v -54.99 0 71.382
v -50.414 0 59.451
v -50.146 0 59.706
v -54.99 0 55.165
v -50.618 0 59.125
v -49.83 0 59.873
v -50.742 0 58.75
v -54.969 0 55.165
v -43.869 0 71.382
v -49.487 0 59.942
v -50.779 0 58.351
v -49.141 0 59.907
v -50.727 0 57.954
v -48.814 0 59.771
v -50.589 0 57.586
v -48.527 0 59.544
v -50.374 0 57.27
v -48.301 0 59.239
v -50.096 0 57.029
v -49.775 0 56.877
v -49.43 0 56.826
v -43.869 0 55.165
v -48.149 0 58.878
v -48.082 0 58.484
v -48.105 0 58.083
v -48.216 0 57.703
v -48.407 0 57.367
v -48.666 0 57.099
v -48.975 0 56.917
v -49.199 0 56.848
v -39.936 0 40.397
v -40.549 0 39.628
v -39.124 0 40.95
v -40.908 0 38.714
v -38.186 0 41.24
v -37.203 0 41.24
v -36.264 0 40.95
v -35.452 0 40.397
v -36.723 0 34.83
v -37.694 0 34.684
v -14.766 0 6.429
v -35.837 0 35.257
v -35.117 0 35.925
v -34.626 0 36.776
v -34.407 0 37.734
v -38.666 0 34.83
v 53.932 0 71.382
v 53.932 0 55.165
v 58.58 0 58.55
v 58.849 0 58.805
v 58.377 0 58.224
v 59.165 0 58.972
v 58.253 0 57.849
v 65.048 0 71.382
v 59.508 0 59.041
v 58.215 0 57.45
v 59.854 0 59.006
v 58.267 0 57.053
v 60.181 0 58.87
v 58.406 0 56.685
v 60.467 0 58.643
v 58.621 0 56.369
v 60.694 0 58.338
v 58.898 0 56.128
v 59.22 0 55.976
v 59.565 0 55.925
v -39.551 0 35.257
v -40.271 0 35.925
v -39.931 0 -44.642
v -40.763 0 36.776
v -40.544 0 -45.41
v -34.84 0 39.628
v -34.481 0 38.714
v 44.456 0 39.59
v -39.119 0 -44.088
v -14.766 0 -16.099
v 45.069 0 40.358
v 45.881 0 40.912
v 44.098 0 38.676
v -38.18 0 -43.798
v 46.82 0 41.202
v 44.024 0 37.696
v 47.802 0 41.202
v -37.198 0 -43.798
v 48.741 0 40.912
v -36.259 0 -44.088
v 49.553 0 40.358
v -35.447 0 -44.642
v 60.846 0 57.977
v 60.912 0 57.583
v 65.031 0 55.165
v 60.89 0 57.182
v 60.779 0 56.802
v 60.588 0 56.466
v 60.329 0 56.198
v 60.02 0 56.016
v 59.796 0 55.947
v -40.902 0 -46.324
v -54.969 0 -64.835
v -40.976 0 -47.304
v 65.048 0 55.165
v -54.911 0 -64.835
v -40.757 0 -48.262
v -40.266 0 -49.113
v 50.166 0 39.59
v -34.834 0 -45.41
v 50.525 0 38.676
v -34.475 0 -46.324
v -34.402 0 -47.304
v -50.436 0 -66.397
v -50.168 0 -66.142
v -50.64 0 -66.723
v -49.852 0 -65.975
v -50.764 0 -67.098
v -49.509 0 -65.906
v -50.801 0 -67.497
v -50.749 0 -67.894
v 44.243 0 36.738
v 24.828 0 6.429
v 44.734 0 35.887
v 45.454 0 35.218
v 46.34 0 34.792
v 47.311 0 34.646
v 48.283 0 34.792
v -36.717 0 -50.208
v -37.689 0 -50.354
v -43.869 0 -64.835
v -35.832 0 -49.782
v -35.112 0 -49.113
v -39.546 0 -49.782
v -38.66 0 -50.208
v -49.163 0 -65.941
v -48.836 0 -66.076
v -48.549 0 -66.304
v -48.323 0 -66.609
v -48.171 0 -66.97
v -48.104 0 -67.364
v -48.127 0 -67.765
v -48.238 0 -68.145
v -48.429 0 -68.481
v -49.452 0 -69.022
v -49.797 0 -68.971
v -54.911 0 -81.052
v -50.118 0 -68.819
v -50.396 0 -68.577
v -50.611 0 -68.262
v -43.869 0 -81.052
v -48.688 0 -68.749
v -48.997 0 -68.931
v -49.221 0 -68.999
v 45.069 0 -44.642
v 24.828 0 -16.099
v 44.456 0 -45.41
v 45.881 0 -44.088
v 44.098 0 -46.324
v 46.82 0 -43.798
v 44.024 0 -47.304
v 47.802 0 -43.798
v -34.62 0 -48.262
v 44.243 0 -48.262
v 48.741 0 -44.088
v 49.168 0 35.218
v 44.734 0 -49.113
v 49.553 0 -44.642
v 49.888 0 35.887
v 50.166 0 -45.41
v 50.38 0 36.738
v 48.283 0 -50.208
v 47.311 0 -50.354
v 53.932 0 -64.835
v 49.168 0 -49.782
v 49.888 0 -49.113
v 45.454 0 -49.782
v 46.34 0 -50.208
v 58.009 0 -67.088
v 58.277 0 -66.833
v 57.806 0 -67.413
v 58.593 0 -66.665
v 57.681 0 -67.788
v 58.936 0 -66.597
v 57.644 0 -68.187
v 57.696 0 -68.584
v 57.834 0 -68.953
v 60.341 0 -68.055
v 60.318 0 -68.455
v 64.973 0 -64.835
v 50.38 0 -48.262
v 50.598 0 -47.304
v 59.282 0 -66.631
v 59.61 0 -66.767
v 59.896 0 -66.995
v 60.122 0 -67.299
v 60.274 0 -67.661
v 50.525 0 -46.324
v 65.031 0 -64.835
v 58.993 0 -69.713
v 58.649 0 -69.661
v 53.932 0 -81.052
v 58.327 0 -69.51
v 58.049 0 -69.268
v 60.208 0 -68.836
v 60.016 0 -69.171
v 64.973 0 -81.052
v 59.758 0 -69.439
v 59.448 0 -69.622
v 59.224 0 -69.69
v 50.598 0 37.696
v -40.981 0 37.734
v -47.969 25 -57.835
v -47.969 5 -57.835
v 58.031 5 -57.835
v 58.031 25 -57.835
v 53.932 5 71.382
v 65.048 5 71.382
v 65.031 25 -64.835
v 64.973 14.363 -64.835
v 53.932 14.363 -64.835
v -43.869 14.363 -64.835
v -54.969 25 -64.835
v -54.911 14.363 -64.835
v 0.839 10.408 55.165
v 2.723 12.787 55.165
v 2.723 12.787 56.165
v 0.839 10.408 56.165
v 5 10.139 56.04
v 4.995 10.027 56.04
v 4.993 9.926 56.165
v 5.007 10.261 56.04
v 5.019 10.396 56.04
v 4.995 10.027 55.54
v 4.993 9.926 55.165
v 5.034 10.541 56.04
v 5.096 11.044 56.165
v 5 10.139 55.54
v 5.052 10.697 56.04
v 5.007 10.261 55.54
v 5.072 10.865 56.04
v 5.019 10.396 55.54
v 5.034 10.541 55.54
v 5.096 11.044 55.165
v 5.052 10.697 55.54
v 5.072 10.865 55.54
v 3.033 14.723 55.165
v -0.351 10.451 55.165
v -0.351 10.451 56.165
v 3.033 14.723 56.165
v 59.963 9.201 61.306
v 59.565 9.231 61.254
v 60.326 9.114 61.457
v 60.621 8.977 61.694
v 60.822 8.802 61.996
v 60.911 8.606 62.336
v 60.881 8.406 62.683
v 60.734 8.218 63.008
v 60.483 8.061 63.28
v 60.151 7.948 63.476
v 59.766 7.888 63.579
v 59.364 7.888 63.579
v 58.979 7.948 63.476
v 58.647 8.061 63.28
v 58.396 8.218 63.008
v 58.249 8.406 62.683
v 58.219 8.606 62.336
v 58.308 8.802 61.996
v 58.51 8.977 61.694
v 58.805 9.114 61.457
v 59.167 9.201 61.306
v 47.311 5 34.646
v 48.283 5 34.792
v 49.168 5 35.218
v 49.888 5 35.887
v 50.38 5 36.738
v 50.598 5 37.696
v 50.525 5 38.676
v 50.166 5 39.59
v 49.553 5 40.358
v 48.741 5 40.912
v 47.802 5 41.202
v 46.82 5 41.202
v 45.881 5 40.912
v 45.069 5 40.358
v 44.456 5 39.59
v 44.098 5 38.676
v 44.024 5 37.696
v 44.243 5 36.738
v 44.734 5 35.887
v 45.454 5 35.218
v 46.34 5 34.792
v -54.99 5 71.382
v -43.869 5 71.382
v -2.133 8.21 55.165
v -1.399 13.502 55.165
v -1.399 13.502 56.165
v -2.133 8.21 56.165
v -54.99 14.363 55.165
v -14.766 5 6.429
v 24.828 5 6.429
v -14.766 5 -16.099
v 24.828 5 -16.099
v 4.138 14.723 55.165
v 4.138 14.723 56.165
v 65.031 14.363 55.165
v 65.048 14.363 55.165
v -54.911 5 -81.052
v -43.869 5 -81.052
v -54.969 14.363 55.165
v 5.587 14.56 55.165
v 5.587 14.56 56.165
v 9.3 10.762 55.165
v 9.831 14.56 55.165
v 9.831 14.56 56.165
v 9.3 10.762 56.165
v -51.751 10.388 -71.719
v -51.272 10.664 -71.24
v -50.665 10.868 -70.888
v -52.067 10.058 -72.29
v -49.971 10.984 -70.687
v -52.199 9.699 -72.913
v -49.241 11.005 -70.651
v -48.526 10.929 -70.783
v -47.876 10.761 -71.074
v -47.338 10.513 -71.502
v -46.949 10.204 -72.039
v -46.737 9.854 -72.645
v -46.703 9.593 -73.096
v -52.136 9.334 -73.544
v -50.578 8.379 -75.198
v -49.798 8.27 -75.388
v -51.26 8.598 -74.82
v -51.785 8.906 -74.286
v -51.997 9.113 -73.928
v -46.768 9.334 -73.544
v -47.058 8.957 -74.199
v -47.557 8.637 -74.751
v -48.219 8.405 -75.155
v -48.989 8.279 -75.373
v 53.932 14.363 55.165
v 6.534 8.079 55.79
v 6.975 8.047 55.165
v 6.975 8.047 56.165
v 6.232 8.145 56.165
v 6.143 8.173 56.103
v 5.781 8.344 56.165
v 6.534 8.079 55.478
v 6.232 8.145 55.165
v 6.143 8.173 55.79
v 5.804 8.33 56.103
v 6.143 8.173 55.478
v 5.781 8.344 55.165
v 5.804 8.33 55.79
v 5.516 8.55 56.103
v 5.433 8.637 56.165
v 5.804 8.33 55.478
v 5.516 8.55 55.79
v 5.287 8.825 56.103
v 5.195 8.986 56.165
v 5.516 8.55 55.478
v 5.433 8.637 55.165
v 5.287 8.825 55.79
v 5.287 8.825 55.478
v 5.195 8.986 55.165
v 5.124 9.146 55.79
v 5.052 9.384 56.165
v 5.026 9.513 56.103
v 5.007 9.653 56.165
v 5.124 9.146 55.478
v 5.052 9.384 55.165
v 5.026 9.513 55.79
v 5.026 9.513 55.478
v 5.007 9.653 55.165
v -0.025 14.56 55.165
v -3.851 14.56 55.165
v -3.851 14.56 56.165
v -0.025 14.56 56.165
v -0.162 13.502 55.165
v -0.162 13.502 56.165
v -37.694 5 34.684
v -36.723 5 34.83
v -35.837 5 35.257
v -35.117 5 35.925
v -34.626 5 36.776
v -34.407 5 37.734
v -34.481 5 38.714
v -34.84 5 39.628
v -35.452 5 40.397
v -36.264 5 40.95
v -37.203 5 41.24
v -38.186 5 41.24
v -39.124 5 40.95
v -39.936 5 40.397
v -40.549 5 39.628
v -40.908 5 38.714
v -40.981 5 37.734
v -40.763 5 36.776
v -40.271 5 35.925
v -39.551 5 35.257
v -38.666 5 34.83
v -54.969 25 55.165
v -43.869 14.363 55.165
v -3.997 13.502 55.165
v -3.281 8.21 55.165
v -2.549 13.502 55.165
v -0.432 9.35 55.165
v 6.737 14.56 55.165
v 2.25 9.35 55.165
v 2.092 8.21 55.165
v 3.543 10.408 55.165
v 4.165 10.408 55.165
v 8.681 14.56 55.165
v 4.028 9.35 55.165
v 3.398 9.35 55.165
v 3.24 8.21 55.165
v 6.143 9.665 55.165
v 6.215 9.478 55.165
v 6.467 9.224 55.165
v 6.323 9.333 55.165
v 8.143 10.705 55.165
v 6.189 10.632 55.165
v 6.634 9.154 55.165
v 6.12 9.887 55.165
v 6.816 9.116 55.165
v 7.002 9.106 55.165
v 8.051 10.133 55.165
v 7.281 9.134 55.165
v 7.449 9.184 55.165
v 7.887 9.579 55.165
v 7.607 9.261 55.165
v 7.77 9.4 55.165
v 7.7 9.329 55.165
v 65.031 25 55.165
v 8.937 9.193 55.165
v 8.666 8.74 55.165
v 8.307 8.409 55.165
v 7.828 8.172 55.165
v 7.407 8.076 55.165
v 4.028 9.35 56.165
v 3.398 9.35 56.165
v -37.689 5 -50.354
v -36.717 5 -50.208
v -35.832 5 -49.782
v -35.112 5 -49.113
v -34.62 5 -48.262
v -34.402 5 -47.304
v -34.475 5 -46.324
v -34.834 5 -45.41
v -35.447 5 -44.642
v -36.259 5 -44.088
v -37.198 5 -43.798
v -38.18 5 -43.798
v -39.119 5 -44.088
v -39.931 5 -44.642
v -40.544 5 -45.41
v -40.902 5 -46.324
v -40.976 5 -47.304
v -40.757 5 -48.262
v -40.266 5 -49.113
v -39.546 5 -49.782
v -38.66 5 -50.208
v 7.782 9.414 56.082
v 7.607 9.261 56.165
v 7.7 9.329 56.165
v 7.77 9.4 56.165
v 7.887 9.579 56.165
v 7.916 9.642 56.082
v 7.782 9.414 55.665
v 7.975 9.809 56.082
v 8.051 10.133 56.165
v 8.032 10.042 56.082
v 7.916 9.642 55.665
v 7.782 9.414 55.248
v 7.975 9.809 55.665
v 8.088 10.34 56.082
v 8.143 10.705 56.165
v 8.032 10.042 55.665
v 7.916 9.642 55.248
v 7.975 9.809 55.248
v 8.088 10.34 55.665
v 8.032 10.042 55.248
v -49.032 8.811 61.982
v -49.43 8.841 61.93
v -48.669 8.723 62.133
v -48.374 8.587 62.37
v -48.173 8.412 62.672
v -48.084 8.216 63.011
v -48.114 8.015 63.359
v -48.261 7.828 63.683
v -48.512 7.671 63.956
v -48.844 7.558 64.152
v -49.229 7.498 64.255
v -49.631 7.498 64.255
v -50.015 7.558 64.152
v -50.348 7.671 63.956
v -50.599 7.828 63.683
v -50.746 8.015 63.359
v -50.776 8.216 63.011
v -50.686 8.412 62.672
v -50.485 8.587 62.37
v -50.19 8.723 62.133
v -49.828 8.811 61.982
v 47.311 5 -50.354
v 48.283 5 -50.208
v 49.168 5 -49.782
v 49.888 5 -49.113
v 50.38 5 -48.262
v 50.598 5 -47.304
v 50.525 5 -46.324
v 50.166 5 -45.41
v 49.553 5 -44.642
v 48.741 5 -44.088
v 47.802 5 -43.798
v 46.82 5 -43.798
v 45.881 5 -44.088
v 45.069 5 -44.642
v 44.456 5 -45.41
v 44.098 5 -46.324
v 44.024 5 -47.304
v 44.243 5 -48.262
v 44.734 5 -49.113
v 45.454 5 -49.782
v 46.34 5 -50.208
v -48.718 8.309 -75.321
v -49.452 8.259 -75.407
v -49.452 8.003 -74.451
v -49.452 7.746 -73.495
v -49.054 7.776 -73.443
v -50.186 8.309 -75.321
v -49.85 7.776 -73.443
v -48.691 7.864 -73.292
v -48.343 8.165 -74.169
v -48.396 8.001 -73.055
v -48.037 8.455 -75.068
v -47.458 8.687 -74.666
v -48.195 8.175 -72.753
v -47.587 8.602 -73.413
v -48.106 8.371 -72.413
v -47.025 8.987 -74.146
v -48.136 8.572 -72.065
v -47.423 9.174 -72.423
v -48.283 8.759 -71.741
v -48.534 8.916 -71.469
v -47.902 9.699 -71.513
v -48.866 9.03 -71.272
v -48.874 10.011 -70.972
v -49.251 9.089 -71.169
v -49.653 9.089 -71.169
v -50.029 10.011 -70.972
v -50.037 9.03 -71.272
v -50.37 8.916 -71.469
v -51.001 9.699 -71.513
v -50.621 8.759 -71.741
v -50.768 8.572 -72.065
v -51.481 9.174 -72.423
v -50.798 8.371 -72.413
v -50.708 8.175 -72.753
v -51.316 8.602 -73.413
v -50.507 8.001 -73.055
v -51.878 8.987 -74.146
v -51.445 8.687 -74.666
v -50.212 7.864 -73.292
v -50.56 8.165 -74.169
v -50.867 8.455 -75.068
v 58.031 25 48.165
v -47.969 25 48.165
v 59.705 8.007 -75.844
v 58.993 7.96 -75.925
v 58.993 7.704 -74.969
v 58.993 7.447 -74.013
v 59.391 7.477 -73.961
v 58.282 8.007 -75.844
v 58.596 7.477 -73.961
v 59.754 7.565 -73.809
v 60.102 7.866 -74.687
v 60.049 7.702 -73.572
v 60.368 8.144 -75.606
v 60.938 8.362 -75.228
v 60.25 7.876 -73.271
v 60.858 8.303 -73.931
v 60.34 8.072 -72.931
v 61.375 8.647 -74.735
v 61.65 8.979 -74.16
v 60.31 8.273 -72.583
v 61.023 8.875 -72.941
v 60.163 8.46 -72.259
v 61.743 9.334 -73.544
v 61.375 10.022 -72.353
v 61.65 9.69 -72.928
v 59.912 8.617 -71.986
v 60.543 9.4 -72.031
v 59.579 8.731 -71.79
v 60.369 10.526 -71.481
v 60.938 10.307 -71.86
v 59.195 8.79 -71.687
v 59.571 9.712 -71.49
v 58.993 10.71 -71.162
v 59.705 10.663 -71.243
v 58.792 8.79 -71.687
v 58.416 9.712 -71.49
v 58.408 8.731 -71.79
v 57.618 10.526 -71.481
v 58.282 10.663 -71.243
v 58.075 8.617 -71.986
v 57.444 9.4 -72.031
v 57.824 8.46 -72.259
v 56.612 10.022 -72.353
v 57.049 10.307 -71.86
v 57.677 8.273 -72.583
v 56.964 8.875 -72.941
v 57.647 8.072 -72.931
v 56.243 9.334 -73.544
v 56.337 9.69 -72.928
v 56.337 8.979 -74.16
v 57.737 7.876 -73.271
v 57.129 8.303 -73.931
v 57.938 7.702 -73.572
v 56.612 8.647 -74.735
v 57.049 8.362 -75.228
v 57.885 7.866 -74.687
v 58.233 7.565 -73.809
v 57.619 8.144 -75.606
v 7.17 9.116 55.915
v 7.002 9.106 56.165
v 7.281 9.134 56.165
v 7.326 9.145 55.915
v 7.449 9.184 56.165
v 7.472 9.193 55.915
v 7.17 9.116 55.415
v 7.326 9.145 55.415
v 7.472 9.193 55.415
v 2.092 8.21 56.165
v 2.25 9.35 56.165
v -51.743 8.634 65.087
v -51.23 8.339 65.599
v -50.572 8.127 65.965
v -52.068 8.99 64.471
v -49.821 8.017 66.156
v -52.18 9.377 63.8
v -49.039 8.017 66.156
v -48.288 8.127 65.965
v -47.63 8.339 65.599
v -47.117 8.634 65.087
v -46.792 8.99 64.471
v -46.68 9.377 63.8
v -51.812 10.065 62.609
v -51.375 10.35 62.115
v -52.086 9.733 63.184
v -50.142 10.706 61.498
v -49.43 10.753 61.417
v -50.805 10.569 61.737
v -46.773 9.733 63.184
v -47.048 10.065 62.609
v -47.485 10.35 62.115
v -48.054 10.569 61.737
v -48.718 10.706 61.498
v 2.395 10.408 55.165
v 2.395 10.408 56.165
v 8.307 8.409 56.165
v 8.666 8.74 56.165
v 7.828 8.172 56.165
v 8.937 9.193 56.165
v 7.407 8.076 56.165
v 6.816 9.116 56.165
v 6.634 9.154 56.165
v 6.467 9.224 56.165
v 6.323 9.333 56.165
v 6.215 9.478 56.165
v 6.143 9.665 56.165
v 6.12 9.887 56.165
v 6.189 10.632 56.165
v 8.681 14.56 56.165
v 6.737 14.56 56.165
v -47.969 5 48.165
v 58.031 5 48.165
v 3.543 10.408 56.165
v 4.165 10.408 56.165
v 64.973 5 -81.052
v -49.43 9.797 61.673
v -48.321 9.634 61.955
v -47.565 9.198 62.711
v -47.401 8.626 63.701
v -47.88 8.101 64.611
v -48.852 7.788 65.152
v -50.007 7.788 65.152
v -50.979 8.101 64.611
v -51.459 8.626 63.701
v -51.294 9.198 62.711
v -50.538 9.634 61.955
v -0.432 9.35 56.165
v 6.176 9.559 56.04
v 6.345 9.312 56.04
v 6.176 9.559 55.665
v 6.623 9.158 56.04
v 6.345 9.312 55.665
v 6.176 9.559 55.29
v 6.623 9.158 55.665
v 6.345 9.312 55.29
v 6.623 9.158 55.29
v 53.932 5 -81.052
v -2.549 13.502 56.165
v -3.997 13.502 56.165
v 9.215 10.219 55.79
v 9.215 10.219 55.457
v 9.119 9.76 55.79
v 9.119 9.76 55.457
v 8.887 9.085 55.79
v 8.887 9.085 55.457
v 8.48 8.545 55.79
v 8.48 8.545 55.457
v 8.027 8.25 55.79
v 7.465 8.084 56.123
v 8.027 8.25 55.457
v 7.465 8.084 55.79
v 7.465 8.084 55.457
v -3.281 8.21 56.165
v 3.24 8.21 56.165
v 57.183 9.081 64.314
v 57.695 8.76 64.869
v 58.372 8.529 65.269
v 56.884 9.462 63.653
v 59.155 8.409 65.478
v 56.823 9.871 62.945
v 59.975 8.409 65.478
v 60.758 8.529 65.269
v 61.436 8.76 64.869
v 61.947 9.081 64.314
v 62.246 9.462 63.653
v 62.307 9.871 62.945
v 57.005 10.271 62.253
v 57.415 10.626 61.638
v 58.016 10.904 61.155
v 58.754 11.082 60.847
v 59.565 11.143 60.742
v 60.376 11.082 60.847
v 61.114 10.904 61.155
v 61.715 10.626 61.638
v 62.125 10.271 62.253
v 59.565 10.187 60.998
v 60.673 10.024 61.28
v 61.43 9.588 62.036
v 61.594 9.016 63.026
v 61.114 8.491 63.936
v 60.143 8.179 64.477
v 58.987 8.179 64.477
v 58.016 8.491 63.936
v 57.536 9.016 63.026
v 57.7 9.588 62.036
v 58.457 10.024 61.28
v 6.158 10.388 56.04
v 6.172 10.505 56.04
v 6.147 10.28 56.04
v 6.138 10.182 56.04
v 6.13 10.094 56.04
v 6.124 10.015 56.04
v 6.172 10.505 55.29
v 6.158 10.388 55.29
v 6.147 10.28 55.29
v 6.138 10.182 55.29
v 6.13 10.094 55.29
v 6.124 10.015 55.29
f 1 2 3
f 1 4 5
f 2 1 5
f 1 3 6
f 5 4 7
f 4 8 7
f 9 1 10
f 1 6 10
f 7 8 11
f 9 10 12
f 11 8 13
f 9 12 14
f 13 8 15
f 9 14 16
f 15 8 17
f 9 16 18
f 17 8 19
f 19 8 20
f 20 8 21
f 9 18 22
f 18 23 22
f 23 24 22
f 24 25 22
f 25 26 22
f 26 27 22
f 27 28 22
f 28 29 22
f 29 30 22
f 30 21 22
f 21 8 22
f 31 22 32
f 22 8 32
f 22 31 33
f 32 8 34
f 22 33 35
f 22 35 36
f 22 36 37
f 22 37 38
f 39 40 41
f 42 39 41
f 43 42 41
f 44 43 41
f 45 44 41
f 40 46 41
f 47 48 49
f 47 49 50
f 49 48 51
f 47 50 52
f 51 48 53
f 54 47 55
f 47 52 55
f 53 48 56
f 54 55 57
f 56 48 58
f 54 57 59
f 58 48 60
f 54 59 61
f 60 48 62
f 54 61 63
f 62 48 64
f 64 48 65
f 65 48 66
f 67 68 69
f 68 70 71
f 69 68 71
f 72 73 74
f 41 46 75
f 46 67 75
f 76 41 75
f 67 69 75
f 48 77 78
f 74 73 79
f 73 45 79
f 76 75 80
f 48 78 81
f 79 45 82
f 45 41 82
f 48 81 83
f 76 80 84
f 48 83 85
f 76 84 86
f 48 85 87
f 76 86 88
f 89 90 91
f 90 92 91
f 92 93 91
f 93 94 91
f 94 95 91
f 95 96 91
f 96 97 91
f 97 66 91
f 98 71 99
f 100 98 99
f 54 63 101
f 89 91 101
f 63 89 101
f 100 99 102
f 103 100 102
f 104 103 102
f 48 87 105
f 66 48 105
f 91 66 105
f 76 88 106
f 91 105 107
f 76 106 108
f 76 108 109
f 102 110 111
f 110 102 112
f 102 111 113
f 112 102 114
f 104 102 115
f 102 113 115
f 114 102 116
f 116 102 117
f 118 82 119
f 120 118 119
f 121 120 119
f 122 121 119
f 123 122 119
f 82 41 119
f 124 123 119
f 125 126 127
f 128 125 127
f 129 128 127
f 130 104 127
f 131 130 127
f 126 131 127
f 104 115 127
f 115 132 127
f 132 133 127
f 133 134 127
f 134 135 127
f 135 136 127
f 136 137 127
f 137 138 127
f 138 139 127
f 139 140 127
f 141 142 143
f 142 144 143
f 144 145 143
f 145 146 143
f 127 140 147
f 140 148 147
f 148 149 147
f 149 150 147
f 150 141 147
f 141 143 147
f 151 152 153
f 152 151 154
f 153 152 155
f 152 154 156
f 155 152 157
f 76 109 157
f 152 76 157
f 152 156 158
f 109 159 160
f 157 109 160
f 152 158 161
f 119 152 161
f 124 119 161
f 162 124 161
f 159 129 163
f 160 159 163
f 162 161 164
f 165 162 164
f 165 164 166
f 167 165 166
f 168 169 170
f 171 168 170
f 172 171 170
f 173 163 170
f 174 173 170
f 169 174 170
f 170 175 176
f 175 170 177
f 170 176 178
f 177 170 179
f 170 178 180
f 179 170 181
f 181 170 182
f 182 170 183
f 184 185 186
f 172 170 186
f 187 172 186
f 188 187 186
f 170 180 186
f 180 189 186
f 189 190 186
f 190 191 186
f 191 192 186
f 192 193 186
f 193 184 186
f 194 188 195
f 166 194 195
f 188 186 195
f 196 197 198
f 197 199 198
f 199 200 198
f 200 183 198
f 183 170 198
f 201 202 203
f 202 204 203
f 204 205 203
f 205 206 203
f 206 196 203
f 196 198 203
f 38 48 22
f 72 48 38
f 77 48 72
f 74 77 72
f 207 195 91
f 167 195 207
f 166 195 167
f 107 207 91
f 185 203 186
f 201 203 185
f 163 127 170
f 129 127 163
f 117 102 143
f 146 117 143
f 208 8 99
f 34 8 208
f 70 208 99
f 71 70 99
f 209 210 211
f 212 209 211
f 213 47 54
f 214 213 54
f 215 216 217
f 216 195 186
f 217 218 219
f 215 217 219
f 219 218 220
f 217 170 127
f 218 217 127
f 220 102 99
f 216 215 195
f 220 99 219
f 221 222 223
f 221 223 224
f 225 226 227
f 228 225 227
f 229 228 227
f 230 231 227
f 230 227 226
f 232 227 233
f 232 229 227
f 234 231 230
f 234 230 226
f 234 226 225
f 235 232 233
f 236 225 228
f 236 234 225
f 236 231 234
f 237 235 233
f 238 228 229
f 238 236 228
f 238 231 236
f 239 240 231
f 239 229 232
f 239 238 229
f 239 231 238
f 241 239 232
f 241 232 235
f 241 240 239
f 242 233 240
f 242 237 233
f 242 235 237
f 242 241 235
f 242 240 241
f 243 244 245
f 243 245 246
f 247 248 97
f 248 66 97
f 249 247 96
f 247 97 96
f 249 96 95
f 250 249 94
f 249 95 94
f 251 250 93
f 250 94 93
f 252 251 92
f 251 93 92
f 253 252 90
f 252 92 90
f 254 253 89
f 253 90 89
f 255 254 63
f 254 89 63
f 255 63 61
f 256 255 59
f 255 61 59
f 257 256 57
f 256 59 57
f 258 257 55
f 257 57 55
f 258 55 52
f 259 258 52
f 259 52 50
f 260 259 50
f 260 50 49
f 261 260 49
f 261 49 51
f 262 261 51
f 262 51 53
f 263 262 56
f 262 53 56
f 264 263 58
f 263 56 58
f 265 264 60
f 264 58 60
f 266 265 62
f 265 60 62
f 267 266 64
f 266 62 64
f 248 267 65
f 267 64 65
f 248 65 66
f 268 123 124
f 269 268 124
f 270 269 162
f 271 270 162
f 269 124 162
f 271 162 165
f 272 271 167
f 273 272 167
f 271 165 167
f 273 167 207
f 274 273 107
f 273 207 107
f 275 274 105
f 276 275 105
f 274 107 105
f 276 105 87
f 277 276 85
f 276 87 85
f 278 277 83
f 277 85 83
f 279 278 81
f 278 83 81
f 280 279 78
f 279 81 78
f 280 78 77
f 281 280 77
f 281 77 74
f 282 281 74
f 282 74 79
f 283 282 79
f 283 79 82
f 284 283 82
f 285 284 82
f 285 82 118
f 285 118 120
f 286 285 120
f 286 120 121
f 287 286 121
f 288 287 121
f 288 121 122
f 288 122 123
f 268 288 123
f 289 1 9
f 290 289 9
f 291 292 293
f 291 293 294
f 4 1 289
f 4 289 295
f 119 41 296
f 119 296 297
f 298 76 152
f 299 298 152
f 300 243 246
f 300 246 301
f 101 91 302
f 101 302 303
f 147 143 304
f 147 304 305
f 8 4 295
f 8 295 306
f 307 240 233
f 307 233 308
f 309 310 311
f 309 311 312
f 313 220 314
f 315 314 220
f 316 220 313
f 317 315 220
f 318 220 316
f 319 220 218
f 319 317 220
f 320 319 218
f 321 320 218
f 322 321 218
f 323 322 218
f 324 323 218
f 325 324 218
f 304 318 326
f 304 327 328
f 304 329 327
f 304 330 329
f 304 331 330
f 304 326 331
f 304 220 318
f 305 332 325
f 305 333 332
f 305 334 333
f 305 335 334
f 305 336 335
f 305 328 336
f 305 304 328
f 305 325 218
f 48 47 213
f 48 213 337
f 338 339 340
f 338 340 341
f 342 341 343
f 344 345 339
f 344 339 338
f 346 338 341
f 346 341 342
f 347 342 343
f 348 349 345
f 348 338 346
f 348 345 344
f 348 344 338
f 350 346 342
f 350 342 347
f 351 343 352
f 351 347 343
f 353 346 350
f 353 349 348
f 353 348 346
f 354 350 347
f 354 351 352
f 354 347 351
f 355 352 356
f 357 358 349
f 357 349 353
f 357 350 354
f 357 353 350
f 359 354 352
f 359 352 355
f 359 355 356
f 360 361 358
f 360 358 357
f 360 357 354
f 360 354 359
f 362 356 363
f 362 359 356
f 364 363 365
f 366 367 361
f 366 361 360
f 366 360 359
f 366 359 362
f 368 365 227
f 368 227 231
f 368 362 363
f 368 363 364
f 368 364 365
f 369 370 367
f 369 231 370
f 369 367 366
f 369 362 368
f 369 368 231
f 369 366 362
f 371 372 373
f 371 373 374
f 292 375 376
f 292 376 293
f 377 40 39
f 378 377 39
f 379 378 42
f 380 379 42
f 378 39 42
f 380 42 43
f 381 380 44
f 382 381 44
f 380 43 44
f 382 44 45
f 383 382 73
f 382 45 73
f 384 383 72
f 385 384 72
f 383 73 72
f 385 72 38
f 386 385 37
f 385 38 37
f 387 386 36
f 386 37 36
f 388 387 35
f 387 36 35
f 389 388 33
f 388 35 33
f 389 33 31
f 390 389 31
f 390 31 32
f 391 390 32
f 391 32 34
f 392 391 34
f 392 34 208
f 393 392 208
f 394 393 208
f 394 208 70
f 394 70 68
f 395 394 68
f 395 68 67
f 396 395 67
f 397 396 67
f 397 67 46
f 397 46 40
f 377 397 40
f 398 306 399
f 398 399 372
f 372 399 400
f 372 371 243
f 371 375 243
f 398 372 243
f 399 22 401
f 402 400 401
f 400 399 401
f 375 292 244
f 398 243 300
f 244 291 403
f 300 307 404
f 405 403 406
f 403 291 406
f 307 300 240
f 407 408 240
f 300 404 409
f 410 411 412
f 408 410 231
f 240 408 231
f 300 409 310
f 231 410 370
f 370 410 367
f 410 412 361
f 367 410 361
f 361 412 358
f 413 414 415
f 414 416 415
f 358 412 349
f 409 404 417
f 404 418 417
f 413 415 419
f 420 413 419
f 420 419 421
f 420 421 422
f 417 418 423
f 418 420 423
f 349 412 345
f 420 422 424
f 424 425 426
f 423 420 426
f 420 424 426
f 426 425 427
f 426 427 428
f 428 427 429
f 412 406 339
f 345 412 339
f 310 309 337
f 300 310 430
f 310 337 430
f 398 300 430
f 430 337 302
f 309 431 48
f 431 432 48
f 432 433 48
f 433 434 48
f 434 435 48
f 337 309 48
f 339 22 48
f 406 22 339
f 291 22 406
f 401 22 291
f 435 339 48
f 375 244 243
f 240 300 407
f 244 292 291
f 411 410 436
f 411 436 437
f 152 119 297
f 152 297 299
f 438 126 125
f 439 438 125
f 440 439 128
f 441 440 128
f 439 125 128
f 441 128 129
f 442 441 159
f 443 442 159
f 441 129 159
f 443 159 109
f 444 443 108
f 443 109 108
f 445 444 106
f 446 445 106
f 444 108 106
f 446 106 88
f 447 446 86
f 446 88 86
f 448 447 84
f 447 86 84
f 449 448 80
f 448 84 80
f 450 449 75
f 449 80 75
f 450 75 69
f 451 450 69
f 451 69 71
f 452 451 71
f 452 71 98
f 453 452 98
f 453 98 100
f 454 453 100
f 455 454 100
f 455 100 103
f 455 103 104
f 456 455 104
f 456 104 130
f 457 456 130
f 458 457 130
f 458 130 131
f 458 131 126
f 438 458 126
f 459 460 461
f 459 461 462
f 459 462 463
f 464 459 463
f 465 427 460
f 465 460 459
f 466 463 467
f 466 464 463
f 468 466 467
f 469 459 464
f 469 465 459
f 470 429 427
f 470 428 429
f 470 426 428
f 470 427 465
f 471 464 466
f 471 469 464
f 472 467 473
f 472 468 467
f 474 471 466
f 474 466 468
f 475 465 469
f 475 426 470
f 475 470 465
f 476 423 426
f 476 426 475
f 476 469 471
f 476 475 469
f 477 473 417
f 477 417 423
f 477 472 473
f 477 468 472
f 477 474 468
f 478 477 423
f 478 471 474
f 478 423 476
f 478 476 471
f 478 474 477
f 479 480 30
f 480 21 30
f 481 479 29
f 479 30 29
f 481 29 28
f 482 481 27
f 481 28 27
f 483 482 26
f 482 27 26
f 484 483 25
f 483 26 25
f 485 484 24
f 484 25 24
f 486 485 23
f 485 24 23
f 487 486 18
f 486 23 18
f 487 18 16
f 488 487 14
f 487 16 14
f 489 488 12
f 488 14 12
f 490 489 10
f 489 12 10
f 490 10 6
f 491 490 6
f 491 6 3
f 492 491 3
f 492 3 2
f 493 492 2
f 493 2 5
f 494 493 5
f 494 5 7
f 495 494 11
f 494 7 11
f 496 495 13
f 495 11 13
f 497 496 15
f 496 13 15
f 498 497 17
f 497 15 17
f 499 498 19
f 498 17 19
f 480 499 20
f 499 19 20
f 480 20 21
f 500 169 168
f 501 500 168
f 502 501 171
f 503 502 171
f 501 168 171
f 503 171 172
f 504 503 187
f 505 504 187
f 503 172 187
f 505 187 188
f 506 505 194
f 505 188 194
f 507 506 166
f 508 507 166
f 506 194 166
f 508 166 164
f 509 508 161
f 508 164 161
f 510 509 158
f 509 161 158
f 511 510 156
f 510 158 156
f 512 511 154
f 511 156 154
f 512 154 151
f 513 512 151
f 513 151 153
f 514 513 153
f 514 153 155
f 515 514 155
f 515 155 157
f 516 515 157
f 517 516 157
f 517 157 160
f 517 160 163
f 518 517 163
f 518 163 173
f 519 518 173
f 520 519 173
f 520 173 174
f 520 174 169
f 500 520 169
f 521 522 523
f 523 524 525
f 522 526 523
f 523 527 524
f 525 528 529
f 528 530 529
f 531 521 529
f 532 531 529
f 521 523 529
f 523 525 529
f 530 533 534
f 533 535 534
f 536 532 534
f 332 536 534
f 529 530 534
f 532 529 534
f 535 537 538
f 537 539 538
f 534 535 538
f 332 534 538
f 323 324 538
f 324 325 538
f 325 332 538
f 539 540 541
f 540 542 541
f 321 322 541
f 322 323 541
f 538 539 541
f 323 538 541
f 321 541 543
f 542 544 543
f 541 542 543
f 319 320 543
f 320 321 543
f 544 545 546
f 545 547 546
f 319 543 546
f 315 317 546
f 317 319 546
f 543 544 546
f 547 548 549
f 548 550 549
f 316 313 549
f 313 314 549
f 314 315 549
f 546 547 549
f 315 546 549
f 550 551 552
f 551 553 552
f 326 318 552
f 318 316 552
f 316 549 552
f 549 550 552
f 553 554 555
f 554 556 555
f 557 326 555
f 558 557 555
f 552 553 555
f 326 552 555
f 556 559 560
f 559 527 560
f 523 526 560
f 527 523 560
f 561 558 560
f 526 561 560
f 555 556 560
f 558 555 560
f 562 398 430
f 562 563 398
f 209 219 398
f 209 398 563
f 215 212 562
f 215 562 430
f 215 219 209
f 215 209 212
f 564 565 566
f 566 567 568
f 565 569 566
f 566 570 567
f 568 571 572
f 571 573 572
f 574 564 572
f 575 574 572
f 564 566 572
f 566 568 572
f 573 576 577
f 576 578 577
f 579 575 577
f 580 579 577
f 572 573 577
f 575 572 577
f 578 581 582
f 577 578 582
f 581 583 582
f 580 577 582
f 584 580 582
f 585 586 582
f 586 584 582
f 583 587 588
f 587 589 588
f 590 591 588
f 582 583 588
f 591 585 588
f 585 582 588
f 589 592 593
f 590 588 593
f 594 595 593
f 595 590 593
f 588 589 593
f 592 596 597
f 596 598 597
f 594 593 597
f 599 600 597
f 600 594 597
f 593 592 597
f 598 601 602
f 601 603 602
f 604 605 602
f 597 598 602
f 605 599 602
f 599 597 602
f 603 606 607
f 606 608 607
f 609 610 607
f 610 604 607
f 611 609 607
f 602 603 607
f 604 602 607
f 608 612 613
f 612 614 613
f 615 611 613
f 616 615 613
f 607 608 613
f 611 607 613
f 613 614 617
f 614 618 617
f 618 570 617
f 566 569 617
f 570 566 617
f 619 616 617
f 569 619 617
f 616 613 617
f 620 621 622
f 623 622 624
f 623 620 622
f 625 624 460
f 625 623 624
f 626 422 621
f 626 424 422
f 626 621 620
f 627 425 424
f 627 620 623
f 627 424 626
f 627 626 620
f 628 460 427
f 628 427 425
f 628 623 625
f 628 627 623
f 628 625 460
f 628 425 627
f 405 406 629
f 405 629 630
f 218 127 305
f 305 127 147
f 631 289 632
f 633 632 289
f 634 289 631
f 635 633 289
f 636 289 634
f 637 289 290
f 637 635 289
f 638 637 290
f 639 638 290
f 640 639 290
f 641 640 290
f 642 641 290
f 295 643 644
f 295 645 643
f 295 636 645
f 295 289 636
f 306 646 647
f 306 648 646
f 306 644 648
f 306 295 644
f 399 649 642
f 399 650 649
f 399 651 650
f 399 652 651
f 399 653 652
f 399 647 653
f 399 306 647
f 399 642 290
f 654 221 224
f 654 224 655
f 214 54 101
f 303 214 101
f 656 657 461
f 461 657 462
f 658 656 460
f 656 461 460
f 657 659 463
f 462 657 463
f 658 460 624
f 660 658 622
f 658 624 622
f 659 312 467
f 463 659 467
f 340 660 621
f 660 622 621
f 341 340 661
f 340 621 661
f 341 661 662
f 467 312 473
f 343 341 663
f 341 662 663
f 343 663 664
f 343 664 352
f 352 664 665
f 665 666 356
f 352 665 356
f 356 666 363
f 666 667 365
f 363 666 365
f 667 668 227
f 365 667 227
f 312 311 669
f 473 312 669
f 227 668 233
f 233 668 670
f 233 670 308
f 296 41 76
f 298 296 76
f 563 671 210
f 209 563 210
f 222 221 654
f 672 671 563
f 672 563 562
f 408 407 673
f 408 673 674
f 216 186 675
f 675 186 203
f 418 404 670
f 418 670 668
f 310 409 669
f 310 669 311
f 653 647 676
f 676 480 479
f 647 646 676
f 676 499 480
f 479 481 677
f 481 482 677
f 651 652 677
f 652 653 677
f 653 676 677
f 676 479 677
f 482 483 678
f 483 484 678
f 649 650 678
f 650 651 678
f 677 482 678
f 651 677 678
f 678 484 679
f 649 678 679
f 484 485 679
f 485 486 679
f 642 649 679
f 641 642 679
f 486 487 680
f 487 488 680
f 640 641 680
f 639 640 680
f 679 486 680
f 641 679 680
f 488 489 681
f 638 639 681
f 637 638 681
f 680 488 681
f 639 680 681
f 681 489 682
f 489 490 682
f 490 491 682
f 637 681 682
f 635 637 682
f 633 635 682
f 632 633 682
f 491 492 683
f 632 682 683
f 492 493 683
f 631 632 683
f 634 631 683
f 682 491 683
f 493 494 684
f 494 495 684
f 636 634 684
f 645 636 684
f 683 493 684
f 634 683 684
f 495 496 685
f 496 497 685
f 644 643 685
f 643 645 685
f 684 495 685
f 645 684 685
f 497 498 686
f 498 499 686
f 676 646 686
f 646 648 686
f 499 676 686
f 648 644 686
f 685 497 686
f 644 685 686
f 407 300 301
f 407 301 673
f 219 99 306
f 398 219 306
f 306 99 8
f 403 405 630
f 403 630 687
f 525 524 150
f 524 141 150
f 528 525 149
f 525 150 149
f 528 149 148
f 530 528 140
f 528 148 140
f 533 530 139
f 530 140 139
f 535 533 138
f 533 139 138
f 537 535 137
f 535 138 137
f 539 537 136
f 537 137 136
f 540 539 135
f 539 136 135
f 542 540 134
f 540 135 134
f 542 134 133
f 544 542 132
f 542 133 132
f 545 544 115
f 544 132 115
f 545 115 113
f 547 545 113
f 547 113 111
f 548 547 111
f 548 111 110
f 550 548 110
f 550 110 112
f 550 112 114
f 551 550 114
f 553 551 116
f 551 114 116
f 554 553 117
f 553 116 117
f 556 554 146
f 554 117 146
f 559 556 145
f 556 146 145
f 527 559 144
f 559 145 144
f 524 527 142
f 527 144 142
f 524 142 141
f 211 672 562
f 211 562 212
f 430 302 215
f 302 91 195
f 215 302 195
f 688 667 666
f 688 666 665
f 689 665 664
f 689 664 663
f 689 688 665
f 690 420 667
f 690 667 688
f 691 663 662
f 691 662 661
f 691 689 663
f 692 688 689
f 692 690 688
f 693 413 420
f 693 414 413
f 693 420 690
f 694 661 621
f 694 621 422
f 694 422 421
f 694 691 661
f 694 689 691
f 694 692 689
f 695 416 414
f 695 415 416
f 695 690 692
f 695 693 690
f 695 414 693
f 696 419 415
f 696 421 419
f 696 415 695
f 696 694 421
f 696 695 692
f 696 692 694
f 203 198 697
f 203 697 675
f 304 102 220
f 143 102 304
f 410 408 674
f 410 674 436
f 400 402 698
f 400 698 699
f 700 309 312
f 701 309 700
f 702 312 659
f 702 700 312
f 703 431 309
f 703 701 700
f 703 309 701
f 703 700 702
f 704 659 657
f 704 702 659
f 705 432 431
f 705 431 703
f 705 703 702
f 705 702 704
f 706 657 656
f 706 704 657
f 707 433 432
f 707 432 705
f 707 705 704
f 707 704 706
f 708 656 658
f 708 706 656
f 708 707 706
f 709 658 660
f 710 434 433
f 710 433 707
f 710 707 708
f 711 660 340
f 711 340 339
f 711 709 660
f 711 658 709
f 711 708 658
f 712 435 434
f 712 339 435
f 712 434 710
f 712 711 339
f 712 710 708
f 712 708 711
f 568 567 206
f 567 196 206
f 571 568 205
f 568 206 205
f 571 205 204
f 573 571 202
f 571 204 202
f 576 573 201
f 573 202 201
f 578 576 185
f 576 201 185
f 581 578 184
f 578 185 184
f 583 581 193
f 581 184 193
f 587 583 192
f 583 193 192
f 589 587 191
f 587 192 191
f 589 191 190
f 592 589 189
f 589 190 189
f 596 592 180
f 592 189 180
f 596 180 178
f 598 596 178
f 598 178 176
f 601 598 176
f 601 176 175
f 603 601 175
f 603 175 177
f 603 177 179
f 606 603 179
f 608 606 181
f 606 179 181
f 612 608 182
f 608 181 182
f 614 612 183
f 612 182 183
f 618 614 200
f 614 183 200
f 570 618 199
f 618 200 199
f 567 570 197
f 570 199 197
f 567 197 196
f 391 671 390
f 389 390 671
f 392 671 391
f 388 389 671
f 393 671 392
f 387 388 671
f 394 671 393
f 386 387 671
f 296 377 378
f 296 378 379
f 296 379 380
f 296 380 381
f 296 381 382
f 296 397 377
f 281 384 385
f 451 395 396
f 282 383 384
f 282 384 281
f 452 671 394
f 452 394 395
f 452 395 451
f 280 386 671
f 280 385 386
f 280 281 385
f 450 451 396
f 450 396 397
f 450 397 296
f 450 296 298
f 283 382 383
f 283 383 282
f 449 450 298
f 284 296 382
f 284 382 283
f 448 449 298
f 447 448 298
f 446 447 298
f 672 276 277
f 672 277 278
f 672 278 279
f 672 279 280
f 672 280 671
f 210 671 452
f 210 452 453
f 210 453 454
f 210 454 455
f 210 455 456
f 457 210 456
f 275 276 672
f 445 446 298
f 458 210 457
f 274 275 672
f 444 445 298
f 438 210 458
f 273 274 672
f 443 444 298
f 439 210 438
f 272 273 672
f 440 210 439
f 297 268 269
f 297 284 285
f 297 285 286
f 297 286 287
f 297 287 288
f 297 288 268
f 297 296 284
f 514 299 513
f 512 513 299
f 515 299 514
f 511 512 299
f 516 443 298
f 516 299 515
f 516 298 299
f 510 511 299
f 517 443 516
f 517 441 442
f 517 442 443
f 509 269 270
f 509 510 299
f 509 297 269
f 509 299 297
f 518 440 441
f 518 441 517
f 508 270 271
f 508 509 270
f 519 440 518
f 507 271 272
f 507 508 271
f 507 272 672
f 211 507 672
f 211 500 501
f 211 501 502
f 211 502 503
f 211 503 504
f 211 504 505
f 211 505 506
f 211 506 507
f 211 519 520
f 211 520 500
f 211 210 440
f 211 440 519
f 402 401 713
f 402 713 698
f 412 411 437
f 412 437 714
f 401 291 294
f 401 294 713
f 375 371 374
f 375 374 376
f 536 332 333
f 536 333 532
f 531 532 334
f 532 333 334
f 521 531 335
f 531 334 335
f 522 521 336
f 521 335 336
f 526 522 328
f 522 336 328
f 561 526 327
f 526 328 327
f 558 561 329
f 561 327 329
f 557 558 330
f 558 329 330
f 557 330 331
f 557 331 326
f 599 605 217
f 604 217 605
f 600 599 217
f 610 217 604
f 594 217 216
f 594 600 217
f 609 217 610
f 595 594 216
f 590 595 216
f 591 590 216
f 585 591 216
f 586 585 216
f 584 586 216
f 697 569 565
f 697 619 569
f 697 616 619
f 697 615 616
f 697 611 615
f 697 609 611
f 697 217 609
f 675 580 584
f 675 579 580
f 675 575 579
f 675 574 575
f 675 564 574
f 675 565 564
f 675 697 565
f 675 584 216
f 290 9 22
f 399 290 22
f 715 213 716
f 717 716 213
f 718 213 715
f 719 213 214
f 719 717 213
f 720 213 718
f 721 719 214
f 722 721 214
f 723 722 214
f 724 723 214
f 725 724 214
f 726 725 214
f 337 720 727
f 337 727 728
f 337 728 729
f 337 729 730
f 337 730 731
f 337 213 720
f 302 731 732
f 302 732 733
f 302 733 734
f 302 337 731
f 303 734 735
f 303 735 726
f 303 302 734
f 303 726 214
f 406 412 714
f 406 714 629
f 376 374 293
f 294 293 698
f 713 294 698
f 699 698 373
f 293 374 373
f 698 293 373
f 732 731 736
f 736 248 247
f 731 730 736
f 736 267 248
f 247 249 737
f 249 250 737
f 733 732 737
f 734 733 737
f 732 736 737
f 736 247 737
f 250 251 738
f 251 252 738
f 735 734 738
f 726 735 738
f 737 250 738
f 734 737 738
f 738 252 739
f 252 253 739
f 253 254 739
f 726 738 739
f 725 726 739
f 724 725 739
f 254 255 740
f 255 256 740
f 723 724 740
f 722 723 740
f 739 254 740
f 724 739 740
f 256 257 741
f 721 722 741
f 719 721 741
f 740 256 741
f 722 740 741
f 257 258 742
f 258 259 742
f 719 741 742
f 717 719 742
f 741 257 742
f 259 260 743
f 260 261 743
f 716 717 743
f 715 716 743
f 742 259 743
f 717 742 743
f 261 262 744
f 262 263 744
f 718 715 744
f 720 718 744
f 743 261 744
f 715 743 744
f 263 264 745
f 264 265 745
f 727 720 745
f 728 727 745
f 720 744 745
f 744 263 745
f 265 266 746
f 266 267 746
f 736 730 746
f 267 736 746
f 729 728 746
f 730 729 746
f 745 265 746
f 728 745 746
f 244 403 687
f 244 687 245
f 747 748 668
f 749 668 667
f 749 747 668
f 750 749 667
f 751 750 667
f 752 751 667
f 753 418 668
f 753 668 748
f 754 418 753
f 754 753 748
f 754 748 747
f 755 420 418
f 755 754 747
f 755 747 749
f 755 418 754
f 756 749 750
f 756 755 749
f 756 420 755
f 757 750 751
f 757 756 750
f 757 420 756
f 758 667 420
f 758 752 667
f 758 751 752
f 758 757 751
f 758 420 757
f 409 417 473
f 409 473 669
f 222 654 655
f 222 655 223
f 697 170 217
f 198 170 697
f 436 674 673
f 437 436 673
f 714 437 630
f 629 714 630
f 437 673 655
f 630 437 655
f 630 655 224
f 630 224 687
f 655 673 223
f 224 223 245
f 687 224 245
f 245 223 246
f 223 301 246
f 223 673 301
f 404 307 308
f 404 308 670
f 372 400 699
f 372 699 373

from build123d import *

# Parameters (mm, degrees)
SKETCH1_W                                            = 106
SKETCH1_H                                            = 106
SKETCH1_W_2                                          = 39.59401571
SKETCH1_H_2                                          = 22.527629628
BOSS_EXTRUDE1_DEPTH                                  = 5
SKETCH1_4_W                                          = 106
SKETCH1_4_H                                          = 106
BOSS_EXTRUDE2_DEPTH                                  = 25
SKETCH1_6_W                                          = 11.041643383
SKETCH1_6_H                                          = 16.216795515
BOSS_EXTRUDE4_DEPTH                                  = 5
SKETCH1_8_W                                          = 11.041643383
SKETCH1_8_H                                          = 16.216795515
BOSS_EXTRUDE5_DEPTH                                  = 5
SKETCH1_10_W                                         = 11.121003358
SKETCH1_10_H                                         = 16.216795515
SKETCH1_10_W_2                                       = 11.11598595
BOSS_EXTRUDE7_DEPTH                                  = 5
DRAFT1_ANGLE                                         = 1
DRAFT2_ANGLE                                         = 45
DRAFT3_ANGLE                                         = 30
DRAFT4_ANGLE                                         = 30
DRAFT6_ANGLE                                         = 30
DRAFT7_ANGLE                                         = 30
CSK_FOR_M2_5_OVAL_HEAD_MACHINE_SCREW1_D              = 2.7
CSK_FOR_M2_5_OVAL_HEAD_MACHINE_SCREW1_CSINK_D        = 5.5
CSK_FOR_M2_5_OVAL_HEAD_MACHINE_SCREW1_CSINK_ANGLE    = 90
CSK_FOR_M2_5_OVAL_HEAD_MACHINE_SCREW1_ON_D           = 2.7
CSK_FOR_M2_5_OVAL_HEAD_MACHINE_SCREW1_ON_CSINK_D     = 5.5
CSK_FOR_M2_5_OVAL_HEAD_MACHINE_SCREW1_ON_CSINK_ANGLE = 90
CSK_FOR_M2_5_OVAL_HEAD_MACHINE_SCREW_2_D             = 2.7
CSK_FOR_M2_5_OVAL_HEAD_MACHINE_SCREW_2_CSINK_D       = 5.5
CSK_FOR_M2_5_OVAL_HEAD_MACHINE_SCREW_2_CSINK_ANGLE   = 90
BOSS_EXTRUDE9_DEPTH                                  = 1
SKETCH14_R                                           = 3.296320564
CUT_EXTRUDE1_DEPTH                                   = 10


with BuildPart() as part:
    # Sketch1 → Boss-Extrude1 (new body)
    with BuildSketch(Plane(origin=(0, 0, 0), x_dir=(1, 0, 0), z_dir=(0, 1, 0))):
        with Locations((5.031290625, 4.83488638)):
            Rectangle(SKETCH1_W, SKETCH1_H)
        with Locations((5.031290625, 4.83488638)):
            Rectangle(SKETCH1_W_2, SKETCH1_H_2, mode=Mode.SUBTRACT)
    extrude(amount=BOSS_EXTRUDE1_DEPTH)

    # Sketch1<4> → Boss-Extrude2 (add)
    with BuildSketch(Plane(origin=(0, 0, 0), x_dir=(1, 0, 0), z_dir=(0, 1, 0))):
        Polygon((-54.910689044, 64.83488638), (-54.968709375, 64.83488638), (-54.968709375, -55.16511362), (-43.869045661, -55.16511362), (53.931626911, -55.16511362), (65.031290625, -55.16511362), (65.031290625, 64.83488638), (64.973270294, 64.83488638), (53.931626911, 64.83488638), (-43.869045661, 64.83488638), align=None)
        with Locations((5.031290625, 4.83488638)):
            Rectangle(SKETCH1_4_W, SKETCH1_4_H, mode=Mode.SUBTRACT)
    extrude(amount=BOSS_EXTRUDE2_DEPTH)

    # Sketch1<6> → Boss-Extrude4 (add)
    with BuildSketch(Plane(origin=(0, 0, 0), x_dir=(1, 0, 0), z_dir=(0, 1, 0))):
        with Locations((-49.389867353, 72.943284138)):
            Rectangle(SKETCH1_6_W, SKETCH1_6_H)
    extrude(amount=BOSS_EXTRUDE4_DEPTH)

    # Sketch1<8> → Boss-Extrude5 (add)
    with BuildSketch(Plane(origin=(0, 0, 0), x_dir=(1, 0, 0), z_dir=(0, 1, 0))):
        with Locations((59.452448602, 72.943284138)):
            Rectangle(SKETCH1_8_W, SKETCH1_8_H)
    extrude(amount=BOSS_EXTRUDE5_DEPTH)

    # Sketch1<10> → Boss-Extrude7 (add)
    with BuildSketch(Plane(origin=(0, 0, 0), x_dir=(1, 0, 0), z_dir=(0, 1, 0))):
        with Locations((-49.42954734, -63.273511378)):
            Rectangle(SKETCH1_10_W, SKETCH1_10_H)
        with Locations((59.489619886, -63.273511378)):
            Rectangle(SKETCH1_10_W_2, SKETCH1_10_H)
    extrude(amount=BOSS_EXTRUDE7_DEPTH)

    # Draft1
    draft1_faces = [part.faces().sort_by_distance(p)[0] for p in [
        (59.489619886, 5, 63.273511377),
    ]]
    draft(draft1_faces, Plane(origin=(0, 5, 71.381909135), x_dir=(1, 0, 0), z_dir=(0, 0, 1)), DRAFT1_ANGLE)

    # Draft2
    draft2_faces = [part.faces().sort_by_distance(p)[0] for p in [
        (59.489619886, 5.141532609, 63.273511377),
    ]]
    draft(draft2_faces, Plane(origin=(0, 5, 71.381909135), x_dir=(1, 0, 0), z_dir=(0, 0, 1)), DRAFT2_ANGLE)

    # Draft3
    draft3_faces = [part.faces().sort_by_distance(p)[0] for p in [
        (59.489619886, 13.108397758, 63.273511377),
    ]]
    draft(draft3_faces, Plane(origin=(0, 5, 71.381909135), x_dir=(1, 0, 0), z_dir=(0, 0, 1)), DRAFT3_ANGLE)

    # Draft4
    draft4_faces = [part.faces().sort_by_distance(p)[0] for p in [
        (-49.42954734, 5, 63.273511377),
    ]]
    draft(draft4_faces, Plane(origin=(0, 5, 71.381909135), x_dir=(1, 0, 0), z_dir=(0, 0, 1)), DRAFT4_ANGLE)

    # Draft6
    draft6_faces = [part.faces().sort_by_distance(p)[0] for p in [
        (-49.389867352, 5, -72.943284138),
    ]]
    draft(draft6_faces, Plane(origin=(0, 5, -81.051681895), x_dir=(-1, 0, 0), z_dir=(0, 0, -1)), DRAFT6_ANGLE)

    # Draft7
    draft7_faces = [part.faces().sort_by_distance(p)[0] for p in [
        (59.452448603, 5, -72.943284138),
    ]]
    draft(draft7_faces, Plane(origin=(0, 5, -81.051681895), x_dir=(-1, 0, 0), z_dir=(0, 0, -1)), DRAFT7_ANGLE)

    # CSK for M2.5 Oval Head Machine Screw1 (through all)
    with Locations(Plane(origin=(59.56504546, 9.768238454, 63.123077871), x_dir=(0, -0.5, 0.866025403784), z_dir=(0, 0.866025403784, 0.5))):
        with Locations((0, 0)):
            CounterSinkHole(CSK_FOR_M2_5_OVAL_HEAD_MACHINE_SCREW1_D / 2, CSK_FOR_M2_5_OVAL_HEAD_MACHINE_SCREW1_CSINK_D / 2, counter_sink_angle=CSK_FOR_M2_5_OVAL_HEAD_MACHINE_SCREW1_CSINK_ANGLE)

    # CSK for M2.5 Oval Head Machine Screw1 on (through all)
    with Locations(Plane(origin=(-49.429743133, 9.378105131, 63.798808608), x_dir=(0, -0.500000174844, 0.866025302838), z_dir=(0, 0.866025302838, 0.500000174844))):
        with Locations((0, 0)):
            CounterSinkHole(CSK_FOR_M2_5_OVAL_HEAD_MACHINE_SCREW1_ON_D / 2, CSK_FOR_M2_5_OVAL_HEAD_MACHINE_SCREW1_ON_CSINK_D / 2, counter_sink_angle=CSK_FOR_M2_5_OVAL_HEAD_MACHINE_SCREW1_ON_CSINK_ANGLE)

    # CSK for M2.5 Oval Head Machine Screw 2 (through all)
    with Locations(Plane(origin=(58.993450062, 9.334850022, -73.543501414), x_dir=(0, 0.500000174844, 0.866025302838), z_dir=(0, 0.866025302838, -0.500000174844))):
        with Locations((-1e-09, 0), (0.598054978, -108.445190593)):
            CounterSinkHole(CSK_FOR_M2_5_OVAL_HEAD_MACHINE_SCREW_2_D / 2, CSK_FOR_M2_5_OVAL_HEAD_MACHINE_SCREW_2_CSINK_D / 2, counter_sink_angle=CSK_FOR_M2_5_OVAL_HEAD_MACHINE_SCREW_2_CSINK_ANGLE)

    # Sketch12 → Boss-Extrude9 (add)
    # profile 1 of 3: a face of its own
    with BuildSketch(Plane.XY.offset(55.16511362)):
        Polygon((-3.851170658, 14.560171439), (-0.024888607, 14.560171439), (-0.162268415, 13.501838106), (-1.398686684, 13.501838106), (-2.132651027, 8.210171439), (-3.281298864, 8.210171439), (-2.548606556, 13.501838106), (-3.997454713, 13.501838106), align=None)
    # profile 2 of 3: a face of its own
    with BuildSketch(Plane.XY.offset(55.16511362)):
        Polygon((3.033084149, 14.722991952), (4.138482787, 14.722991952), (3.543170287, 10.408248363), (4.165195527, 10.408248363), (4.02781572, 9.349915029), (3.398158268, 9.349915029), (3.240425896, 8.210171439), (2.09177806, 8.210171439), (2.249510431, 9.349915029), (-0.431939889, 9.349915029), (-0.350529633, 10.451497561), align=None)
        Polygon((2.722707547, 12.786954292), (0.838823332, 10.408248363), (2.394522451, 10.408248363), align=None, mode=Mode.SUBTRACT)
    # profile 3 of 3: a face of its own
    with BuildSketch(Plane.XY.offset(55.16511362)):
        with BuildLine():
            Line((5.587330944, 14.560171439), (6.737250816, 14.560171439))
            Line((6.737250816, 14.560171439), (6.18900362, 10.632126568))
            add(Edge.make_bspline(
                [(6.18900362, 10.632126568), (6.183402023, 10.589736798), (6.172653558, 10.508398408), (6.158581474, 10.390948009), (6.147050147, 10.283246207), (6.13835648, 10.185232364), (6.130880723, 10.097032869), (6.123537243, 10.018693331), (6.12156611, 9.949475892), (6.120711369, 9.906641739), (6.120313717, 9.886713907)],
                knots=[0, 0, 0, 0, 1.370131483, 2.629037392, 3.790386942, 4.840899086, 5.781938864, 6.627066857, 7.36126714, 8, 8, 8, 8], degree=3))
            add(Edge.make_bspline(
                [(6.120313717, 9.886713907), (6.122742642, 9.828360814), (6.127388042, 9.71675862), (6.16976809, 9.558832982), (6.242605071, 9.422303405), (6.342570448, 9.306046085), (6.471150802, 9.214343156), (6.626800051, 9.151679105), (6.806028148, 9.111359223), (6.934173097, 9.107645252), (7.001834149, 9.10568426)],
                knots=[0, 0, 0, 0, 1.044998619, 1.998593913, 2.903381636, 3.798178852, 4.724466667, 5.705876195, 6.788693348, 8, 8, 8, 8], degree=3))
            add(Edge.make_bspline(
                [(7.001834149, 9.10568426), (7.057956567, 9.10757675), (7.167183867, 9.111259975), (7.325257031, 9.141736219), (7.473400904, 9.188647388), (7.56300684, 9.236972554), (7.607322931, 9.260872561)],
                knots=[0, 0, 0, 0, 1.064320597, 2.071415827, 3.046186936, 4, 4, 4, 4], degree=3))
            add(Edge.make_bspline(
                [(7.607322931, 9.260872561), (7.638661016, 9.282340052), (7.702720081, 9.326222359), (7.786339544, 9.413823207), (7.858235271, 9.520602949), (7.910381874, 9.624167973), (7.948256851, 9.722135286), (7.977464559, 9.813799465), (8.004312179, 9.922521662), (8.034401264, 10.046840649), (8.061248289, 10.18798869), (8.090077245, 10.345103027), (8.115677693, 10.519286472), (8.133525812, 10.641031997), (8.142849774, 10.704632577)],
                knots=[0, 0, 0, 0, 0.859785812, 1.75751252, 2.725816041, 3.770921983, 4.379908327, 5.106796295, 5.951169398, 6.919234109, 8.007475297, 9.209126838, 10.542031388, 12, 12, 12, 12], degree=3))
            Line((8.142849774, 10.704632577), (8.680920688, 14.560171439))
            Line((8.680920688, 14.560171439), (9.83084056, 14.560171439))
            Line((9.83084056, 14.560171439), (9.300401858, 10.761874164))
            add(Edge.make_bspline(
                [(9.300401858, 10.761874164), (9.287330457, 10.668092192), (9.262027799, 10.486555944), (9.217376218, 10.225362872), (9.170597614, 9.984815521), (9.121368674, 9.764847607), (9.067892151, 9.565539541), (9.013042193, 9.38586844), (8.953041543, 9.227611129), (8.890292597, 9.087508153), (8.821373712, 8.962161975), (8.747602604, 8.845752783), (8.666530187, 8.737141123), (8.575826106, 8.63806749), (8.481605009, 8.543048189), (8.377649998, 8.458270008), (8.267945247, 8.379873555), (8.150621707, 8.310376789), (8.026985628, 8.247221014), (7.895497152, 8.194520818), (7.758455425, 8.148438624), (7.614268415, 8.111548668), (7.463936721, 8.082329695), (7.306681889, 8.062566996), (7.143267757, 8.04903768), (7.031968043, 8.047921181), (6.975121409, 8.047350927)],
                knots=[0, 0, 0, 0, 1.689301192, 3.270025079, 4.726951413, 6.061161684, 7.290631986, 8.408026906, 9.411210366, 10.308389253, 11.14458747, 11.960942218, 12.765860093, 13.558707188, 14.355765744, 15.150991277, 15.948624031, 16.759492273, 17.581610214, 18.423095804, 19.284310986, 20.159533266, 21.076429259, 22.014764283, 22.986035413, 24, 24, 24, 24], degree=3))
            add(Edge.make_bspline(
                [(6.975121409, 8.047350927), (6.899147588, 8.048587808), (6.751454442, 8.050992305), (6.536301922, 8.076231064), (6.333976611, 8.114679105), (6.144184028, 8.169981914), (5.966590773, 8.239025973), (5.802820172, 8.326551549), (5.651359669, 8.428658918), (5.513849709, 8.546937553), (5.392382824, 8.679882671), (5.283545327, 8.822523738), (5.194999105, 8.979481857), (5.120877418, 9.146334823), (5.063065349, 9.324939947), (5.023512275, 9.515179828), (4.996651616, 9.716770462), (4.994428674, 9.855245029), (4.993290479, 9.926147)],
                knots=[0, 0, 0, 0, 1.177265359, 2.288604451, 3.35342386, 4.366487498, 5.349088925, 6.301818939, 7.238910628, 8.175748691, 9.10608431, 10.02633368, 10.950892497, 11.892606604, 12.852970325, 13.854711106, 14.901565705, 16, 16, 16, 16], degree=3))
            add(Edge.make_bspline(
                [(4.993290479, 9.926147), (4.993463542, 9.959650681), (4.993829568, 10.030510458), (4.999712409, 10.142016979), (5.007029362, 10.26504099), (5.018557194, 10.399061752), (5.03427852, 10.544419142), (5.052121268, 10.700877502), (5.072117704, 10.868893718), (5.088076227, 10.984505296), (5.096325335, 11.044265991)],
                knots=[0, 0, 0, 0, 0.71553134, 1.513337966, 2.384471215, 3.347928436, 4.386088841, 5.507247356, 6.711473103, 8, 8, 8, 8], degree=3))
            Line((5.096325335, 11.044265991), (5.587330944, 14.560171439))
        make_face()
    extrude(amount=BOSS_EXTRUDE9_DEPTH)

    # Sketch14 → Cut-Extrude1 (cut)
    with BuildSketch(Plane(origin=(0, 0, 0), x_dir=(-1, 0, 0), z_dir=(0, -1, 0))):
        with Locations(Location((37.694214755, -37.98017666, 0), (0, 0, 90))):
            Circle(SKETCH14_R)
        with Locations(Location((-47.311196673, -37.942022361, 0), (0, 0, 90))):
            Circle(SKETCH14_R)
        with Locations(Location((-47.311196673, 47.057977639, 0), (0, 0, 90))):
            Circle(SKETCH14_R)
        with Locations(Location((37.688803327, 47.057977639, 0), (0, 0, 90))):
            Circle(SKETCH14_R)
    extrude(amount=-CUT_EXTRUDE1_DEPTH, mode=Mode.SUBTRACT)


solid = part.part
